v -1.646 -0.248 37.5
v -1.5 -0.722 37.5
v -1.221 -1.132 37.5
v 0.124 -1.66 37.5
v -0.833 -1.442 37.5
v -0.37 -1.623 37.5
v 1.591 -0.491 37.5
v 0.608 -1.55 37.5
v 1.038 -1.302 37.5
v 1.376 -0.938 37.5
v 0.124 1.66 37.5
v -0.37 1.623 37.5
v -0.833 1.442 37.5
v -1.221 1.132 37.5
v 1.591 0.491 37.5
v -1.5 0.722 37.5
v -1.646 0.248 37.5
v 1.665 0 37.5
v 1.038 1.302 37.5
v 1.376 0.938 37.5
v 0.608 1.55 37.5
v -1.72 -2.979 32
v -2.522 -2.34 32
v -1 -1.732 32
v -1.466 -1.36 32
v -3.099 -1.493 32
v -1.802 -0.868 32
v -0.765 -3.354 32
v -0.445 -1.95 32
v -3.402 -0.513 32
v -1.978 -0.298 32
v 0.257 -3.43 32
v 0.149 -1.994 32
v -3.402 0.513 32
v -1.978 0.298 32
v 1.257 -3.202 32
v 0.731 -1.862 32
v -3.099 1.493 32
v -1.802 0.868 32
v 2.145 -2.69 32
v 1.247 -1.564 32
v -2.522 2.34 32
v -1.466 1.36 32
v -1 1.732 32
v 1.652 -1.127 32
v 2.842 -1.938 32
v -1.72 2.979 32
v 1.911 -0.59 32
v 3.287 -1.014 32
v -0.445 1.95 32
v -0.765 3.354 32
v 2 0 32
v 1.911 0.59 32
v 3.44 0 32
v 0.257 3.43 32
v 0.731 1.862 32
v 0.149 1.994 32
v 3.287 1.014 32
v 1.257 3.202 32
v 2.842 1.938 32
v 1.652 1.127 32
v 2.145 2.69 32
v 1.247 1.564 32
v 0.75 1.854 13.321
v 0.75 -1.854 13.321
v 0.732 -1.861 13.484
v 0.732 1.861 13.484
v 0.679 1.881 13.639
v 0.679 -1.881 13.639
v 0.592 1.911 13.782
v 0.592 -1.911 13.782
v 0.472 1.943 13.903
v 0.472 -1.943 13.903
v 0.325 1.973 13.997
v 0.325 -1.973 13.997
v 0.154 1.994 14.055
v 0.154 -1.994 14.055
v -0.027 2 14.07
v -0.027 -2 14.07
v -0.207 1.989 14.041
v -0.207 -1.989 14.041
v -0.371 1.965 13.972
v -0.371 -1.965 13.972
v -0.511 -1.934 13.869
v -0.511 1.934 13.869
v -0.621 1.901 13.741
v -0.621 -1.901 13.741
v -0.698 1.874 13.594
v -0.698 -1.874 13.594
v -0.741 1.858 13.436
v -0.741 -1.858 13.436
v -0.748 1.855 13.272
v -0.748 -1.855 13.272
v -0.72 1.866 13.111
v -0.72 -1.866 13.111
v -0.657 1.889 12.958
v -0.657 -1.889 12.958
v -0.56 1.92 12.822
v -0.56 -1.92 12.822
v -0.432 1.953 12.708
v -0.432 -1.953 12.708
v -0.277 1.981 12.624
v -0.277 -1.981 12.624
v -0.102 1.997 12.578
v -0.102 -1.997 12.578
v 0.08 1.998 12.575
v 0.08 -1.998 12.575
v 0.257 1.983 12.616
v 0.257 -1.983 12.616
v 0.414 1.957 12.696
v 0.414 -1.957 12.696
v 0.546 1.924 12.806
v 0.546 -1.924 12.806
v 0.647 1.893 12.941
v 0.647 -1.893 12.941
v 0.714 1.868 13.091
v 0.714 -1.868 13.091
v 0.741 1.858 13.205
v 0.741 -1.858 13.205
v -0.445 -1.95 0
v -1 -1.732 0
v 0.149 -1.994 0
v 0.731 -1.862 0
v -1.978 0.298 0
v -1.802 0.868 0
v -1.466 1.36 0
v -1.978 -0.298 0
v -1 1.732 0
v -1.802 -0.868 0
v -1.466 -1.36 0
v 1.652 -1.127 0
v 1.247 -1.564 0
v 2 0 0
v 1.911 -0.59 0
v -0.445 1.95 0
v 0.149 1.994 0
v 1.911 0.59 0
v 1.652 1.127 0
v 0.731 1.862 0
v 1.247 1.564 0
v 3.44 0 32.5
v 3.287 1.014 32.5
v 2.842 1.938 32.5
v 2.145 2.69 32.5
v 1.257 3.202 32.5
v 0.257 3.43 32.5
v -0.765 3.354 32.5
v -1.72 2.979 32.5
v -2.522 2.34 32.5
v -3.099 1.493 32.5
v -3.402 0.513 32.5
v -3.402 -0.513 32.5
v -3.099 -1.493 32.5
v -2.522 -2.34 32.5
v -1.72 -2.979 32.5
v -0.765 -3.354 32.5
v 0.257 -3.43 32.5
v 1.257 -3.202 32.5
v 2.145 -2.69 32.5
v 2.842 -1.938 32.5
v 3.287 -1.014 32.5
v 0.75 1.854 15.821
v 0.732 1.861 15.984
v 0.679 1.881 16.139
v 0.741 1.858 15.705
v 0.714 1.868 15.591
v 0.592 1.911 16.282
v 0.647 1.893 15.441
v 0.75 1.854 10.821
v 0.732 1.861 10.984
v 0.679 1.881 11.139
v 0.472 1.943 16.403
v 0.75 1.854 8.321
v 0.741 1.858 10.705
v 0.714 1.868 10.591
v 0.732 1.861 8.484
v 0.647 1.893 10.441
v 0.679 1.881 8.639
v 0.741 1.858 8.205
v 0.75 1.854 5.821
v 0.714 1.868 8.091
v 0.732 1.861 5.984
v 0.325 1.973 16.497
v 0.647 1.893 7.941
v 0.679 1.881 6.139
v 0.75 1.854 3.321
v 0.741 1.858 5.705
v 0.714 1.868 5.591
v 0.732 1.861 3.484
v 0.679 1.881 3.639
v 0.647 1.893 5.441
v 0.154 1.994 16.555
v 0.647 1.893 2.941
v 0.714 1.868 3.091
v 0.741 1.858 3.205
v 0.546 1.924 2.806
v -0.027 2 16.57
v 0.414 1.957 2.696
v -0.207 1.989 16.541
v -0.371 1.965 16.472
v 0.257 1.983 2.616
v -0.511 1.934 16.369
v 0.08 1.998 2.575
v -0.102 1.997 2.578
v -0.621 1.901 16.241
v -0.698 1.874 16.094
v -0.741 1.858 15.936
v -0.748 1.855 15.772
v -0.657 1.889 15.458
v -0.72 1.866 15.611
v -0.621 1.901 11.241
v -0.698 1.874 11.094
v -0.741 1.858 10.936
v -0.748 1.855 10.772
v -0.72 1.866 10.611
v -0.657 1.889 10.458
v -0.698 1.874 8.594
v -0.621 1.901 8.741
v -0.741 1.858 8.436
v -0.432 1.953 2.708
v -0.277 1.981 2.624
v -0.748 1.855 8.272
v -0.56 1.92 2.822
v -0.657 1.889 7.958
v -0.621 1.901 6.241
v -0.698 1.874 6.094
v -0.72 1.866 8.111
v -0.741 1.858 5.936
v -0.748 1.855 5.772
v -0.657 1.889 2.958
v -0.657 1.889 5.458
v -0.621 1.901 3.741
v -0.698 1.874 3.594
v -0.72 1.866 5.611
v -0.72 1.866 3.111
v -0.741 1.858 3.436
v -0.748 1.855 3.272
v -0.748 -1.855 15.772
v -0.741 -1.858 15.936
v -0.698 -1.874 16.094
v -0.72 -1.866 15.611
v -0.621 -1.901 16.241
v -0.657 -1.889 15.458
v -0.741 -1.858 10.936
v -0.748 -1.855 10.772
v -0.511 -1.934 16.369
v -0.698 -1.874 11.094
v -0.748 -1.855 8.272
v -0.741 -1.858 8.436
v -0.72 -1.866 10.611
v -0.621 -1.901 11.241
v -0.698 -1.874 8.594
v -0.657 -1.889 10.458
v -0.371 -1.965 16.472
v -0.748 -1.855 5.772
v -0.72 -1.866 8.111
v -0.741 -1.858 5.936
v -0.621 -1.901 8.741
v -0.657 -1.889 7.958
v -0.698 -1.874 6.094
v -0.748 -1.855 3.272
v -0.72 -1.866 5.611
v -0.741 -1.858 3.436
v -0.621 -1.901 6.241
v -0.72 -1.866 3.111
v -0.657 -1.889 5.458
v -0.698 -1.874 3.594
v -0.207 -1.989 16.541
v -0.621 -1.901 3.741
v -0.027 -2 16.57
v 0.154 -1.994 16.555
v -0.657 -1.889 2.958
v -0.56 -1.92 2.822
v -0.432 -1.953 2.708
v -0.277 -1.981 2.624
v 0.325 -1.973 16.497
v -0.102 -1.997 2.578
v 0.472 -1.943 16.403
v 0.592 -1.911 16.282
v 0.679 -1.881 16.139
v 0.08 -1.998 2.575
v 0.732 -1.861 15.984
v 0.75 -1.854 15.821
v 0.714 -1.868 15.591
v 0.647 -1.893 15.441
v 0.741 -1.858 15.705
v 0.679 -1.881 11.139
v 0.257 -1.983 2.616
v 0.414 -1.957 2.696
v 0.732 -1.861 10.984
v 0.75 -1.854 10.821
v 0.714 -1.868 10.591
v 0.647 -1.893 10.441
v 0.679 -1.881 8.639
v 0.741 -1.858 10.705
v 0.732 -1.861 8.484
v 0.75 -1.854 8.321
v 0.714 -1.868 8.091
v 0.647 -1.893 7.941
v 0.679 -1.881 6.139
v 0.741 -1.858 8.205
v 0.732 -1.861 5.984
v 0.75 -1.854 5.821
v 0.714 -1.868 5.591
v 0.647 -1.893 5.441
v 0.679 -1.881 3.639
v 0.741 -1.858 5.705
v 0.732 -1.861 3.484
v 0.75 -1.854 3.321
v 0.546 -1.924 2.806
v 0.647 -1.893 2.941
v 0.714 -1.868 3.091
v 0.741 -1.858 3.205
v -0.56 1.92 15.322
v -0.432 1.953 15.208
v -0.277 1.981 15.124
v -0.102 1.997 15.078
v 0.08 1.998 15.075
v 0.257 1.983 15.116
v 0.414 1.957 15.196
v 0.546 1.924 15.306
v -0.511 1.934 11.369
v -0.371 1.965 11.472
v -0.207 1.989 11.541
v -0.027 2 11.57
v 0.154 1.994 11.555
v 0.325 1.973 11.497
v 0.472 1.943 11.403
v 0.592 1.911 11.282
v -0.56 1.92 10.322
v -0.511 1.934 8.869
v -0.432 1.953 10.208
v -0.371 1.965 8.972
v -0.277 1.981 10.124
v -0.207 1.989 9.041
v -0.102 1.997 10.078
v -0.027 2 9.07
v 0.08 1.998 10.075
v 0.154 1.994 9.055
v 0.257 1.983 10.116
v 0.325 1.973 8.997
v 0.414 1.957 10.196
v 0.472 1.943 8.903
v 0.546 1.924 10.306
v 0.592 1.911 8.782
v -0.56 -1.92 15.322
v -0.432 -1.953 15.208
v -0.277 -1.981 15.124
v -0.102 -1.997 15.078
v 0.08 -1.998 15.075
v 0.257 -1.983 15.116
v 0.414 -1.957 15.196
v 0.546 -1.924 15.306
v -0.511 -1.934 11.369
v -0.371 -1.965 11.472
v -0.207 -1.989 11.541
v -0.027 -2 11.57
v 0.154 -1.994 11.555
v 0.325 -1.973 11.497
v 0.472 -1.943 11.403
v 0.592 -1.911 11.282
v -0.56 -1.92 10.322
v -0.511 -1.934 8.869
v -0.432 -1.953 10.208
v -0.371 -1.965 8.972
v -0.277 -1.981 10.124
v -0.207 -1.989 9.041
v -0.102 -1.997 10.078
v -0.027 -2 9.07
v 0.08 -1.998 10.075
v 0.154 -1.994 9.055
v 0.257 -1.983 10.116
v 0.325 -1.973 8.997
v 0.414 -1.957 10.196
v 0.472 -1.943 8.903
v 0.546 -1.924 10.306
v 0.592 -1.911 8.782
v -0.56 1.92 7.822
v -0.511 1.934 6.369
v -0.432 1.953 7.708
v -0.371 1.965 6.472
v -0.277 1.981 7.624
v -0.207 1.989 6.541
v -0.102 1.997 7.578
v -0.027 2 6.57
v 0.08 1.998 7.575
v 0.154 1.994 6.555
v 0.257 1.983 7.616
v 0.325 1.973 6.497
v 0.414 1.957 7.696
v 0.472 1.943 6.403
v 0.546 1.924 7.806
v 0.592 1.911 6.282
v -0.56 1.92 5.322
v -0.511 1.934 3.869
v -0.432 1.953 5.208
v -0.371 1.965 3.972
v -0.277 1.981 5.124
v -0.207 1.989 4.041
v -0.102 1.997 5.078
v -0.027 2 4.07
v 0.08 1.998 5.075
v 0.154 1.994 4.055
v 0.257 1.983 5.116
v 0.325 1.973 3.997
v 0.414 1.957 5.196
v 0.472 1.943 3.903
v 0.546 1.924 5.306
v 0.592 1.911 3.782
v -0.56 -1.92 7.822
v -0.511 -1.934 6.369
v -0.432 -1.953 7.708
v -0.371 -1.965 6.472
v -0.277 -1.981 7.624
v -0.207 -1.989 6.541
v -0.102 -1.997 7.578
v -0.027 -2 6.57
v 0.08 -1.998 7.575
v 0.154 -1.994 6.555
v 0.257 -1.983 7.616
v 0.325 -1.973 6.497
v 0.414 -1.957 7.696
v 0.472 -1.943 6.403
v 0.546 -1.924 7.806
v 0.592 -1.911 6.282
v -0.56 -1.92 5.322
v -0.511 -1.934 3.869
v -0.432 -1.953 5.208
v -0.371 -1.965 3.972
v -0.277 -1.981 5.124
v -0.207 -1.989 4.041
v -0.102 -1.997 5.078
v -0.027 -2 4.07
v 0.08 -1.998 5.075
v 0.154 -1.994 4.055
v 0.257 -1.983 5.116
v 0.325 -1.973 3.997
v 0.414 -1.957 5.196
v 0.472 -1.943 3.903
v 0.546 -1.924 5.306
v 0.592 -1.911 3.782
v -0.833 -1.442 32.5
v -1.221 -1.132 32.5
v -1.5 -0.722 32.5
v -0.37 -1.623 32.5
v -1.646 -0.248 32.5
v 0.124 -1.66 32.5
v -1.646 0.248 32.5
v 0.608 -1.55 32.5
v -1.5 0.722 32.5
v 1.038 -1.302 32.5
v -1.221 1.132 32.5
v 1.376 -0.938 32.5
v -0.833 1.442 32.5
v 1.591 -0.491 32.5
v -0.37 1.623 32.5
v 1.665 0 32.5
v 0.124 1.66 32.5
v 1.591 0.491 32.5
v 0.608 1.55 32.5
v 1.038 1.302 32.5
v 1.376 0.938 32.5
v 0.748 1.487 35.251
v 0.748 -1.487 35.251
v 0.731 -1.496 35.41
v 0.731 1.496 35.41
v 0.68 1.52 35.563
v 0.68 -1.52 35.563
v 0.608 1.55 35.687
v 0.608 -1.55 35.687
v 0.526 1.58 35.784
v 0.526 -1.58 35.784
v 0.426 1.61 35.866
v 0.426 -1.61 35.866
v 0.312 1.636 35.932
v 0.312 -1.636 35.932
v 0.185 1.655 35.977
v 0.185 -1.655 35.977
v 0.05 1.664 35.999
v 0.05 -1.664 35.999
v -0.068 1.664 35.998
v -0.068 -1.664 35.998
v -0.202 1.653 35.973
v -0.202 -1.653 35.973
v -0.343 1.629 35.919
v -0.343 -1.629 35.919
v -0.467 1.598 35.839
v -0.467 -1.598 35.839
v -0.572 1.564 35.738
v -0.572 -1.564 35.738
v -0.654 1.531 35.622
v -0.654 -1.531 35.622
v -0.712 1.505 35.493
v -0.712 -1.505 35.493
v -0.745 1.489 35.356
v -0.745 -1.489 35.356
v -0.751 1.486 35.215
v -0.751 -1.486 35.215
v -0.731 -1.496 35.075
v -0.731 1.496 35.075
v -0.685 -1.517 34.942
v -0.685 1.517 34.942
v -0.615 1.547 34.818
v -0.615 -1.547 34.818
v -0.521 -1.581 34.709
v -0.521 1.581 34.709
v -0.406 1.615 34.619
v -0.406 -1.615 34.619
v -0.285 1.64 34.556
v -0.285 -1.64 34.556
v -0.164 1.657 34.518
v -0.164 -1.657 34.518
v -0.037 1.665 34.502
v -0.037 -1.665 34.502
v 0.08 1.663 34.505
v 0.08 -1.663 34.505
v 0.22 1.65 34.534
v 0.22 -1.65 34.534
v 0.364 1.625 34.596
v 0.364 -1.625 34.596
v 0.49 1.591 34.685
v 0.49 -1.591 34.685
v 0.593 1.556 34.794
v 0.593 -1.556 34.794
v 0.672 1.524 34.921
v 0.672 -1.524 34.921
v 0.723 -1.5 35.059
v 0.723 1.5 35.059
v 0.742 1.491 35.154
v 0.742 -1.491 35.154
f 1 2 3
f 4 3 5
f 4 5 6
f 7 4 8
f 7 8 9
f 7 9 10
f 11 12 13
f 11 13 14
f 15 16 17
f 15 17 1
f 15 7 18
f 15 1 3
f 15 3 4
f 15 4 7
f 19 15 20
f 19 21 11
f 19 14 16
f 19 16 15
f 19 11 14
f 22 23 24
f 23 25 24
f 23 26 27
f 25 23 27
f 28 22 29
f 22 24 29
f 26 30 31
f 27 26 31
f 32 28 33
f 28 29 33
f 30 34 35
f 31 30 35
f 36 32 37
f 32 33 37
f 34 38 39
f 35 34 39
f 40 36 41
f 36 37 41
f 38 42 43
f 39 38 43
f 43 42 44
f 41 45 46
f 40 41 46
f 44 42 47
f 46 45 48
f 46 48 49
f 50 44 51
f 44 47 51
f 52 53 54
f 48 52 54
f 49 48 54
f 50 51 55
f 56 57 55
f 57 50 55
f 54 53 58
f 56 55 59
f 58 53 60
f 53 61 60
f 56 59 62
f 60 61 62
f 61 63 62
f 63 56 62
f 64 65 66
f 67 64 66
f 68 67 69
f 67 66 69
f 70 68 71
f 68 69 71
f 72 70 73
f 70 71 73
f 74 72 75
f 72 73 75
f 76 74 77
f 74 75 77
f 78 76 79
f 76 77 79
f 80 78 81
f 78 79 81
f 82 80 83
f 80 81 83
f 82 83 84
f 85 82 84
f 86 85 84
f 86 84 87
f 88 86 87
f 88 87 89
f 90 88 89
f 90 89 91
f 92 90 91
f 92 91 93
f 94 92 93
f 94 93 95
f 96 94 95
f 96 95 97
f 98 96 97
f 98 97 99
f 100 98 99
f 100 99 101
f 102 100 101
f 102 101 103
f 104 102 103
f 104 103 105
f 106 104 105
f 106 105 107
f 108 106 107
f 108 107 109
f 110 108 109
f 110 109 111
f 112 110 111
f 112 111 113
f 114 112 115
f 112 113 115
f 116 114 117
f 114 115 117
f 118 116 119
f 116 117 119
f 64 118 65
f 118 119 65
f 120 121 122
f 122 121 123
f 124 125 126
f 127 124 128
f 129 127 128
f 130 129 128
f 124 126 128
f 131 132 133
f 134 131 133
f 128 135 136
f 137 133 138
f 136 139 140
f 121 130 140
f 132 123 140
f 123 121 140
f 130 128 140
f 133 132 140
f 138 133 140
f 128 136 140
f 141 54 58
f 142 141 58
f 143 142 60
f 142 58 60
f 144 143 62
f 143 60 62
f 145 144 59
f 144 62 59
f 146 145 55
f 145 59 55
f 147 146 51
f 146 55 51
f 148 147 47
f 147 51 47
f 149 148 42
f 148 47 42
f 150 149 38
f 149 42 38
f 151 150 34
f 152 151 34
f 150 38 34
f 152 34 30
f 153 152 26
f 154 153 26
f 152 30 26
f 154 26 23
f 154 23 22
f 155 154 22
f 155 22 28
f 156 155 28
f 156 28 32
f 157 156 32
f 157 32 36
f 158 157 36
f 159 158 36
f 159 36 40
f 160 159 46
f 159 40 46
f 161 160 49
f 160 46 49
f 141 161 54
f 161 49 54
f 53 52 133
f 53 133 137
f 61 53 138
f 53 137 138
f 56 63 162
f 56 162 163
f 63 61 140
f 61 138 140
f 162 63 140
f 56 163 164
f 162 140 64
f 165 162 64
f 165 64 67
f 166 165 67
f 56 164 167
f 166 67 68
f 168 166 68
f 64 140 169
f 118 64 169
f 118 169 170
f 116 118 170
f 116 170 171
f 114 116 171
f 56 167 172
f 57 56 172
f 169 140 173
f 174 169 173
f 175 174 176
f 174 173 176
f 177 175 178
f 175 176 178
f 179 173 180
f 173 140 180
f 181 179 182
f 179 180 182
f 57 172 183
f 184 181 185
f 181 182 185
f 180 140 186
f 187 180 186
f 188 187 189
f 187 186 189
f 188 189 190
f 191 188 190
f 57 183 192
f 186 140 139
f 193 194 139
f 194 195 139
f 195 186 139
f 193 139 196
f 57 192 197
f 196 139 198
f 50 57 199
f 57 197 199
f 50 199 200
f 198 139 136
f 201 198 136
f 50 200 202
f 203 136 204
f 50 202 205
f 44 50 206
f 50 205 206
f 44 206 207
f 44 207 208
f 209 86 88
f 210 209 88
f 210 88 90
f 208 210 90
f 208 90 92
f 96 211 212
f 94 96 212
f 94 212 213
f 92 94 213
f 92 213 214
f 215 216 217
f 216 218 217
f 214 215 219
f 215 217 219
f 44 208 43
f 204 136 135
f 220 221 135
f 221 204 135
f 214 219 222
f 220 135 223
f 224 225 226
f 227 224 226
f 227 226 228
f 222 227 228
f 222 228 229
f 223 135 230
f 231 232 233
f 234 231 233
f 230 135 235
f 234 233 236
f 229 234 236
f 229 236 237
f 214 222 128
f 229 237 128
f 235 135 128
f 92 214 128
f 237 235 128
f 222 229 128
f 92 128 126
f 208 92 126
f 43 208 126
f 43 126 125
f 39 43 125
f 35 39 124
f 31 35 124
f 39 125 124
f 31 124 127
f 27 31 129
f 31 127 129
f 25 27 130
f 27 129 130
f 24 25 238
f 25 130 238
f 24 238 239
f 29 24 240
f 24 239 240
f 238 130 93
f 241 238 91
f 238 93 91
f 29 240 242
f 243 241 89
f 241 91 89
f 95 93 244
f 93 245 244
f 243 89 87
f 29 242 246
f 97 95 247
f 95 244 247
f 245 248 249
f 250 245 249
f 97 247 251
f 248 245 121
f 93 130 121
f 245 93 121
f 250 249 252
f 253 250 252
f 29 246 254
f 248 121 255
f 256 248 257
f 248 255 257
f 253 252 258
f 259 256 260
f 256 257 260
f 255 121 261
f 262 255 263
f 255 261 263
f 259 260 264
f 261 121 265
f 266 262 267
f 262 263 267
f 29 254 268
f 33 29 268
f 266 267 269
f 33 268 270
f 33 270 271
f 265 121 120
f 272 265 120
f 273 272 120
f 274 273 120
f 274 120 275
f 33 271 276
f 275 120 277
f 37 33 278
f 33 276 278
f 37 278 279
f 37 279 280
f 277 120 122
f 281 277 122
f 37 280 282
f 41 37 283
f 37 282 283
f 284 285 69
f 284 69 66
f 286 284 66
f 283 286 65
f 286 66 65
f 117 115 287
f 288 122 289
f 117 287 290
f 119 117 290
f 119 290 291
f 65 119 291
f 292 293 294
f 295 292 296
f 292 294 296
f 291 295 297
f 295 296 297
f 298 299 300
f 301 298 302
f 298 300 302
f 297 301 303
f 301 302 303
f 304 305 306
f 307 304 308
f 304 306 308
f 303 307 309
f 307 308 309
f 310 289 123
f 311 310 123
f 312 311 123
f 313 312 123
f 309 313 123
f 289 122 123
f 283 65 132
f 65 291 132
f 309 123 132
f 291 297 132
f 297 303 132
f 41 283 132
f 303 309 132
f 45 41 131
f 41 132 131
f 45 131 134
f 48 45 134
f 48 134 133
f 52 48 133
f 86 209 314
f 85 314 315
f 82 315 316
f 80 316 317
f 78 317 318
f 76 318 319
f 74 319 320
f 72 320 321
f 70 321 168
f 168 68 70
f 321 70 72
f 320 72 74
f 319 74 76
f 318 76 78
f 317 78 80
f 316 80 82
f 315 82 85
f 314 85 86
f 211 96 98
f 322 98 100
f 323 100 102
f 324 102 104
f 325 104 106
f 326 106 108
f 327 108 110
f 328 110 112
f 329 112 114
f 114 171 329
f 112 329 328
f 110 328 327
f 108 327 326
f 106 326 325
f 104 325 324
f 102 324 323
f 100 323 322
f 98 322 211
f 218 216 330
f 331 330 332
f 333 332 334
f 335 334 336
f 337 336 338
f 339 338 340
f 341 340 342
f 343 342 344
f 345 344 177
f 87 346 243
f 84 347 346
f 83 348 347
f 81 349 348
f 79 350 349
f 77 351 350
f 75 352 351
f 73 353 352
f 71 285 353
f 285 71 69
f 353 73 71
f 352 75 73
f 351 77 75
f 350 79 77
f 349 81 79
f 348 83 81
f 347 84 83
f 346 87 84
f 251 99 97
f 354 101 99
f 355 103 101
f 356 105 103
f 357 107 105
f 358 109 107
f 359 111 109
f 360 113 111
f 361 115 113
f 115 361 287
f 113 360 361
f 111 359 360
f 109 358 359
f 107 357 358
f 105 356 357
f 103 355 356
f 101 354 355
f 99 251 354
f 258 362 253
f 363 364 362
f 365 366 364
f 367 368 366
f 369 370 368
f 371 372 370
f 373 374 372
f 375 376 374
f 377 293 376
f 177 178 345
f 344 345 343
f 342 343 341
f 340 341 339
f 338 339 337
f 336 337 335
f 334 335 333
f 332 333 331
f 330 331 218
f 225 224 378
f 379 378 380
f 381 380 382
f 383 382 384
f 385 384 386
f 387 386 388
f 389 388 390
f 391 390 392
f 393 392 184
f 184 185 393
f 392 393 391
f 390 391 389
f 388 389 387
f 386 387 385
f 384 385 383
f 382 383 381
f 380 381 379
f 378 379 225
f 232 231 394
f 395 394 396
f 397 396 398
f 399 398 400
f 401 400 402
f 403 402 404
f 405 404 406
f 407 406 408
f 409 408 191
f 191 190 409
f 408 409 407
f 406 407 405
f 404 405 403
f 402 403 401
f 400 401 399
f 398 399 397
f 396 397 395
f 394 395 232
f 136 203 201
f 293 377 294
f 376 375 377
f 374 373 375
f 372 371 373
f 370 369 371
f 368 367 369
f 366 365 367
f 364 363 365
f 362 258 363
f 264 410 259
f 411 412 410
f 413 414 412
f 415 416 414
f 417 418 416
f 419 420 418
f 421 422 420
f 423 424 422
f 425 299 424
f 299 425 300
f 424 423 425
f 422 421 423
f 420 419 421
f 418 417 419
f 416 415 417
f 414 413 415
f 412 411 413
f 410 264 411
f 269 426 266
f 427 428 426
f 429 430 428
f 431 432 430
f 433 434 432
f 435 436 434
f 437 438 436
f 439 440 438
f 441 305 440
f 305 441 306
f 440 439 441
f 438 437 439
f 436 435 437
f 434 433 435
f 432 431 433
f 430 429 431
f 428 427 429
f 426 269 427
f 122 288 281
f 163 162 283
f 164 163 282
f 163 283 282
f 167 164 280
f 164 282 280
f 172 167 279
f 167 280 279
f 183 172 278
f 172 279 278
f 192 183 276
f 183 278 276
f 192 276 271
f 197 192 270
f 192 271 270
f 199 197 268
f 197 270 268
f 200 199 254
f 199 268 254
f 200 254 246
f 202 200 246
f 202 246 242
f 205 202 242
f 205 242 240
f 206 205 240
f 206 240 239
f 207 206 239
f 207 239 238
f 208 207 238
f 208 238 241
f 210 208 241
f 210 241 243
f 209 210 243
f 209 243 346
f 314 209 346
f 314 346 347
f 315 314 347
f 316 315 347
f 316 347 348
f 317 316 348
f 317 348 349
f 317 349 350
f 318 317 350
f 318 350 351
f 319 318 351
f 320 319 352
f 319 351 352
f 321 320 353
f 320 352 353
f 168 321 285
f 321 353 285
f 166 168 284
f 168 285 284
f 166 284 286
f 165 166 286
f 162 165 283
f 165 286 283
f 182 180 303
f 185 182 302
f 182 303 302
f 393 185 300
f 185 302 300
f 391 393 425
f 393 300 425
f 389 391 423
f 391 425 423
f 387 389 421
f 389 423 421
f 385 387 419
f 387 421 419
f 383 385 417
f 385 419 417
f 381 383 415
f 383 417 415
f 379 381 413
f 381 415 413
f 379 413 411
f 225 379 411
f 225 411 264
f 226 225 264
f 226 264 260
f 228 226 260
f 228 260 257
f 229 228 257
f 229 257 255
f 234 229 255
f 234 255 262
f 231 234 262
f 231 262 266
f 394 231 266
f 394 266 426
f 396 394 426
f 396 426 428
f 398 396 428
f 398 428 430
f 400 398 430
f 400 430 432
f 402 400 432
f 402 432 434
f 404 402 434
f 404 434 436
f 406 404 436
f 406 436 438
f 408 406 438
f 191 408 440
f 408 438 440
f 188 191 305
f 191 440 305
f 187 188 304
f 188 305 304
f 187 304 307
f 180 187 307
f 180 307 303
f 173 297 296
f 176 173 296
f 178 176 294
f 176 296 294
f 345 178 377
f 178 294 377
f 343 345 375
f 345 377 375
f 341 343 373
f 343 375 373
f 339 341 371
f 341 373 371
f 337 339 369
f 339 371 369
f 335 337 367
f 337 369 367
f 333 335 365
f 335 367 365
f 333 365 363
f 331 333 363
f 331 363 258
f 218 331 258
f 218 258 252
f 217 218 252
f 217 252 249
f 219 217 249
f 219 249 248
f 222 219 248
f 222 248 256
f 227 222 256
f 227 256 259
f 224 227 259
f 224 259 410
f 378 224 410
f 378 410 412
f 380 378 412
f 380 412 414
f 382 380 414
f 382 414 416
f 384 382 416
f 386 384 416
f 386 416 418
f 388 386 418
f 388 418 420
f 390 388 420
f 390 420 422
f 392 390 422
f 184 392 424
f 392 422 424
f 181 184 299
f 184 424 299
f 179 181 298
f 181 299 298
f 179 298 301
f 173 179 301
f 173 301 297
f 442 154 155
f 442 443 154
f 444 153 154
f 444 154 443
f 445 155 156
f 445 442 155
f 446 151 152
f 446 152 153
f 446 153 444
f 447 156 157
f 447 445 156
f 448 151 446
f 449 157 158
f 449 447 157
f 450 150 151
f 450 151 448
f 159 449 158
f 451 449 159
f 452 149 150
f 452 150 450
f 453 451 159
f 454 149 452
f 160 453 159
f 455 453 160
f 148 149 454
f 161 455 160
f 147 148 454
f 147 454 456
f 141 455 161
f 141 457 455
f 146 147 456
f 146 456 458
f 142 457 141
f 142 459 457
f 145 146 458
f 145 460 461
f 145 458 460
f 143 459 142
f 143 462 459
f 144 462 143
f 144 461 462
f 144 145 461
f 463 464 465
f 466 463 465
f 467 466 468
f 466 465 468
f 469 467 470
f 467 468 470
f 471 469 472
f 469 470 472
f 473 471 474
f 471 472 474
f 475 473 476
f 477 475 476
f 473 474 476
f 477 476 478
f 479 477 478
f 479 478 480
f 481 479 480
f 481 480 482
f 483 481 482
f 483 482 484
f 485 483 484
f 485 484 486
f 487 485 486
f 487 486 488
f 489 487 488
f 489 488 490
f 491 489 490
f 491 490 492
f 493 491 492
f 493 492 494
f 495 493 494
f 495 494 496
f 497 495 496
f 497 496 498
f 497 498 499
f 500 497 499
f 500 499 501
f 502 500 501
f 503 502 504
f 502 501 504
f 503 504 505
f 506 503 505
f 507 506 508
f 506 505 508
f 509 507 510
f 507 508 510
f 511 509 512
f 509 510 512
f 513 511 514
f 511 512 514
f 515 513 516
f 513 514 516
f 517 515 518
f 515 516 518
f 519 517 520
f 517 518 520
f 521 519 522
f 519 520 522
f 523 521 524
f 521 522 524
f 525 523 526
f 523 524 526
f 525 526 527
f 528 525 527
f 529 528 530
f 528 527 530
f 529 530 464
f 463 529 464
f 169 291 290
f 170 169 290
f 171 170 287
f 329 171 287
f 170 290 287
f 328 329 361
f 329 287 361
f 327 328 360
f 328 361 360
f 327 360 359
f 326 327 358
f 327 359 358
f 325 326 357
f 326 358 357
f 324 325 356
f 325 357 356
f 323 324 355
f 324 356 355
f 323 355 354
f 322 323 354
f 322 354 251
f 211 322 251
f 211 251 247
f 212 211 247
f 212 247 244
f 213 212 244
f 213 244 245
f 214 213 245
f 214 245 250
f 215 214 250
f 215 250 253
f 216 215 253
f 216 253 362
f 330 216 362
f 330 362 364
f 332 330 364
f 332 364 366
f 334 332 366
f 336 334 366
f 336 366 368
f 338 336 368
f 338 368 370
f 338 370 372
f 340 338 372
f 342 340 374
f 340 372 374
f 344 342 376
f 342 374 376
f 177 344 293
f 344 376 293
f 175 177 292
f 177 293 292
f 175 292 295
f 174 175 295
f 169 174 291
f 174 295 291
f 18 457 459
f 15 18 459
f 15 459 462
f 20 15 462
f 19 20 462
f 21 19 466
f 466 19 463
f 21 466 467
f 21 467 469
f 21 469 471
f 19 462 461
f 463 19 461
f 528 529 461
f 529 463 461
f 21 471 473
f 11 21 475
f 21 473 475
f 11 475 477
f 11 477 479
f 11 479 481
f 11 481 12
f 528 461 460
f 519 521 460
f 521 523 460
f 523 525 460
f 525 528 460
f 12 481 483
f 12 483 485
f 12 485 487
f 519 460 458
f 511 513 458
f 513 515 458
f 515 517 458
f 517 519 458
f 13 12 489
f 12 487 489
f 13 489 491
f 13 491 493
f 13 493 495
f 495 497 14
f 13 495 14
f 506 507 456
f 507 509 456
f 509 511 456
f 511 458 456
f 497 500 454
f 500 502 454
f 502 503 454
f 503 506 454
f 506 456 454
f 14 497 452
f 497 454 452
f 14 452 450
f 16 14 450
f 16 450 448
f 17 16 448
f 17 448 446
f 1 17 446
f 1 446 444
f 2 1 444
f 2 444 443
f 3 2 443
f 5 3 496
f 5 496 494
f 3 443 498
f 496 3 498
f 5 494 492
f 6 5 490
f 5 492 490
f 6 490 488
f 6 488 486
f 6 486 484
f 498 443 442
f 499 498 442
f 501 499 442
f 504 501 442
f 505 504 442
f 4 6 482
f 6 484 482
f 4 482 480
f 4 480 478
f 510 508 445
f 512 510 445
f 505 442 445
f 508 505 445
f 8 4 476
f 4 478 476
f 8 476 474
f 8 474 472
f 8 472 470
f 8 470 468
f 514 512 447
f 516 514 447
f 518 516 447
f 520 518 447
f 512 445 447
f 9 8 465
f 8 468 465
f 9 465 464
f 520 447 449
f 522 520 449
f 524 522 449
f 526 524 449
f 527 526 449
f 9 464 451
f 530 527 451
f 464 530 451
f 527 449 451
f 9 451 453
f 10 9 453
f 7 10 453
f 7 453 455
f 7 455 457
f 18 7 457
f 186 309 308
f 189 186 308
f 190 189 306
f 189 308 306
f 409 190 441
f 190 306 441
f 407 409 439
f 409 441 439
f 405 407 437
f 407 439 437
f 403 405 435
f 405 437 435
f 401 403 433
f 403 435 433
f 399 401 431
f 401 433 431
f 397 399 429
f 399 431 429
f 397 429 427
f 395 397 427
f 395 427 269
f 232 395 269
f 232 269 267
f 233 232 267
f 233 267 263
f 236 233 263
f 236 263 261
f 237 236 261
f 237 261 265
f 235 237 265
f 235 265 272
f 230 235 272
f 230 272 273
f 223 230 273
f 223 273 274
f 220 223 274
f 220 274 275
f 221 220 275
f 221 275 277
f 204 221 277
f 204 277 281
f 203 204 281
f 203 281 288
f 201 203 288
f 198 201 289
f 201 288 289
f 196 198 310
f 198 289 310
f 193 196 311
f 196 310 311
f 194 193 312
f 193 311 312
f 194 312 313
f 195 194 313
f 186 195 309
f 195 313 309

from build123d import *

# Parameters (mm, degrees)
F0_R     = 2
F1_DEPTH = 32
F2_R     = 3.44
F2_R_2   = 2
F3_DEPTH = 0.5
F4_R     = 1.665
F5_DEPTH = 5
F7_R     = 0.75
F8_DEPTH = 10


with BuildPart() as f1:
    # F0 (on Top) → F1 (new body)
    with BuildSketch(Plane.XY):
        Circle(F0_R)
    extrude(amount=F1_DEPTH)

    # F2 (on face) → F3 (join)
    with BuildSketch(Plane.XY.offset(32)):
        Circle(F2_R)
        Circle(F2_R_2, mode=Mode.SUBTRACT)
        Circle(F2_R_2)
    extrude(amount=F3_DEPTH)

    # F4 (on face) → F5 (join)
    with BuildSketch(Plane.XY.offset(32.5)):
        Circle(F4_R)
    extrude(amount=F5_DEPTH)

    # F7 (on offset) → F8 (cut)
    with BuildSketch(Plane.XZ.offset(4)):
        with Locations((0, 3.3206201717)):
            Circle(F7_R)
        with Locations((0, 5.8206201717)):
            Circle(F7_R)
        with Locations((0, 8.3206201717)):
            Circle(F7_R)
        with Locations((0, 10.8206201717)):
            Circle(F7_R)
        with Locations((-0.0019225008, 35.2506788733)):
            Circle(F7_R)
        with Locations((0, 13.3206201717)):
            Circle(F7_R)
        with Locations((0, 15.8206201717)):
            Circle(F7_R)
    extrude(amount=-F8_DEPTH, mode=Mode.SUBTRACT)


solid = f1.part
